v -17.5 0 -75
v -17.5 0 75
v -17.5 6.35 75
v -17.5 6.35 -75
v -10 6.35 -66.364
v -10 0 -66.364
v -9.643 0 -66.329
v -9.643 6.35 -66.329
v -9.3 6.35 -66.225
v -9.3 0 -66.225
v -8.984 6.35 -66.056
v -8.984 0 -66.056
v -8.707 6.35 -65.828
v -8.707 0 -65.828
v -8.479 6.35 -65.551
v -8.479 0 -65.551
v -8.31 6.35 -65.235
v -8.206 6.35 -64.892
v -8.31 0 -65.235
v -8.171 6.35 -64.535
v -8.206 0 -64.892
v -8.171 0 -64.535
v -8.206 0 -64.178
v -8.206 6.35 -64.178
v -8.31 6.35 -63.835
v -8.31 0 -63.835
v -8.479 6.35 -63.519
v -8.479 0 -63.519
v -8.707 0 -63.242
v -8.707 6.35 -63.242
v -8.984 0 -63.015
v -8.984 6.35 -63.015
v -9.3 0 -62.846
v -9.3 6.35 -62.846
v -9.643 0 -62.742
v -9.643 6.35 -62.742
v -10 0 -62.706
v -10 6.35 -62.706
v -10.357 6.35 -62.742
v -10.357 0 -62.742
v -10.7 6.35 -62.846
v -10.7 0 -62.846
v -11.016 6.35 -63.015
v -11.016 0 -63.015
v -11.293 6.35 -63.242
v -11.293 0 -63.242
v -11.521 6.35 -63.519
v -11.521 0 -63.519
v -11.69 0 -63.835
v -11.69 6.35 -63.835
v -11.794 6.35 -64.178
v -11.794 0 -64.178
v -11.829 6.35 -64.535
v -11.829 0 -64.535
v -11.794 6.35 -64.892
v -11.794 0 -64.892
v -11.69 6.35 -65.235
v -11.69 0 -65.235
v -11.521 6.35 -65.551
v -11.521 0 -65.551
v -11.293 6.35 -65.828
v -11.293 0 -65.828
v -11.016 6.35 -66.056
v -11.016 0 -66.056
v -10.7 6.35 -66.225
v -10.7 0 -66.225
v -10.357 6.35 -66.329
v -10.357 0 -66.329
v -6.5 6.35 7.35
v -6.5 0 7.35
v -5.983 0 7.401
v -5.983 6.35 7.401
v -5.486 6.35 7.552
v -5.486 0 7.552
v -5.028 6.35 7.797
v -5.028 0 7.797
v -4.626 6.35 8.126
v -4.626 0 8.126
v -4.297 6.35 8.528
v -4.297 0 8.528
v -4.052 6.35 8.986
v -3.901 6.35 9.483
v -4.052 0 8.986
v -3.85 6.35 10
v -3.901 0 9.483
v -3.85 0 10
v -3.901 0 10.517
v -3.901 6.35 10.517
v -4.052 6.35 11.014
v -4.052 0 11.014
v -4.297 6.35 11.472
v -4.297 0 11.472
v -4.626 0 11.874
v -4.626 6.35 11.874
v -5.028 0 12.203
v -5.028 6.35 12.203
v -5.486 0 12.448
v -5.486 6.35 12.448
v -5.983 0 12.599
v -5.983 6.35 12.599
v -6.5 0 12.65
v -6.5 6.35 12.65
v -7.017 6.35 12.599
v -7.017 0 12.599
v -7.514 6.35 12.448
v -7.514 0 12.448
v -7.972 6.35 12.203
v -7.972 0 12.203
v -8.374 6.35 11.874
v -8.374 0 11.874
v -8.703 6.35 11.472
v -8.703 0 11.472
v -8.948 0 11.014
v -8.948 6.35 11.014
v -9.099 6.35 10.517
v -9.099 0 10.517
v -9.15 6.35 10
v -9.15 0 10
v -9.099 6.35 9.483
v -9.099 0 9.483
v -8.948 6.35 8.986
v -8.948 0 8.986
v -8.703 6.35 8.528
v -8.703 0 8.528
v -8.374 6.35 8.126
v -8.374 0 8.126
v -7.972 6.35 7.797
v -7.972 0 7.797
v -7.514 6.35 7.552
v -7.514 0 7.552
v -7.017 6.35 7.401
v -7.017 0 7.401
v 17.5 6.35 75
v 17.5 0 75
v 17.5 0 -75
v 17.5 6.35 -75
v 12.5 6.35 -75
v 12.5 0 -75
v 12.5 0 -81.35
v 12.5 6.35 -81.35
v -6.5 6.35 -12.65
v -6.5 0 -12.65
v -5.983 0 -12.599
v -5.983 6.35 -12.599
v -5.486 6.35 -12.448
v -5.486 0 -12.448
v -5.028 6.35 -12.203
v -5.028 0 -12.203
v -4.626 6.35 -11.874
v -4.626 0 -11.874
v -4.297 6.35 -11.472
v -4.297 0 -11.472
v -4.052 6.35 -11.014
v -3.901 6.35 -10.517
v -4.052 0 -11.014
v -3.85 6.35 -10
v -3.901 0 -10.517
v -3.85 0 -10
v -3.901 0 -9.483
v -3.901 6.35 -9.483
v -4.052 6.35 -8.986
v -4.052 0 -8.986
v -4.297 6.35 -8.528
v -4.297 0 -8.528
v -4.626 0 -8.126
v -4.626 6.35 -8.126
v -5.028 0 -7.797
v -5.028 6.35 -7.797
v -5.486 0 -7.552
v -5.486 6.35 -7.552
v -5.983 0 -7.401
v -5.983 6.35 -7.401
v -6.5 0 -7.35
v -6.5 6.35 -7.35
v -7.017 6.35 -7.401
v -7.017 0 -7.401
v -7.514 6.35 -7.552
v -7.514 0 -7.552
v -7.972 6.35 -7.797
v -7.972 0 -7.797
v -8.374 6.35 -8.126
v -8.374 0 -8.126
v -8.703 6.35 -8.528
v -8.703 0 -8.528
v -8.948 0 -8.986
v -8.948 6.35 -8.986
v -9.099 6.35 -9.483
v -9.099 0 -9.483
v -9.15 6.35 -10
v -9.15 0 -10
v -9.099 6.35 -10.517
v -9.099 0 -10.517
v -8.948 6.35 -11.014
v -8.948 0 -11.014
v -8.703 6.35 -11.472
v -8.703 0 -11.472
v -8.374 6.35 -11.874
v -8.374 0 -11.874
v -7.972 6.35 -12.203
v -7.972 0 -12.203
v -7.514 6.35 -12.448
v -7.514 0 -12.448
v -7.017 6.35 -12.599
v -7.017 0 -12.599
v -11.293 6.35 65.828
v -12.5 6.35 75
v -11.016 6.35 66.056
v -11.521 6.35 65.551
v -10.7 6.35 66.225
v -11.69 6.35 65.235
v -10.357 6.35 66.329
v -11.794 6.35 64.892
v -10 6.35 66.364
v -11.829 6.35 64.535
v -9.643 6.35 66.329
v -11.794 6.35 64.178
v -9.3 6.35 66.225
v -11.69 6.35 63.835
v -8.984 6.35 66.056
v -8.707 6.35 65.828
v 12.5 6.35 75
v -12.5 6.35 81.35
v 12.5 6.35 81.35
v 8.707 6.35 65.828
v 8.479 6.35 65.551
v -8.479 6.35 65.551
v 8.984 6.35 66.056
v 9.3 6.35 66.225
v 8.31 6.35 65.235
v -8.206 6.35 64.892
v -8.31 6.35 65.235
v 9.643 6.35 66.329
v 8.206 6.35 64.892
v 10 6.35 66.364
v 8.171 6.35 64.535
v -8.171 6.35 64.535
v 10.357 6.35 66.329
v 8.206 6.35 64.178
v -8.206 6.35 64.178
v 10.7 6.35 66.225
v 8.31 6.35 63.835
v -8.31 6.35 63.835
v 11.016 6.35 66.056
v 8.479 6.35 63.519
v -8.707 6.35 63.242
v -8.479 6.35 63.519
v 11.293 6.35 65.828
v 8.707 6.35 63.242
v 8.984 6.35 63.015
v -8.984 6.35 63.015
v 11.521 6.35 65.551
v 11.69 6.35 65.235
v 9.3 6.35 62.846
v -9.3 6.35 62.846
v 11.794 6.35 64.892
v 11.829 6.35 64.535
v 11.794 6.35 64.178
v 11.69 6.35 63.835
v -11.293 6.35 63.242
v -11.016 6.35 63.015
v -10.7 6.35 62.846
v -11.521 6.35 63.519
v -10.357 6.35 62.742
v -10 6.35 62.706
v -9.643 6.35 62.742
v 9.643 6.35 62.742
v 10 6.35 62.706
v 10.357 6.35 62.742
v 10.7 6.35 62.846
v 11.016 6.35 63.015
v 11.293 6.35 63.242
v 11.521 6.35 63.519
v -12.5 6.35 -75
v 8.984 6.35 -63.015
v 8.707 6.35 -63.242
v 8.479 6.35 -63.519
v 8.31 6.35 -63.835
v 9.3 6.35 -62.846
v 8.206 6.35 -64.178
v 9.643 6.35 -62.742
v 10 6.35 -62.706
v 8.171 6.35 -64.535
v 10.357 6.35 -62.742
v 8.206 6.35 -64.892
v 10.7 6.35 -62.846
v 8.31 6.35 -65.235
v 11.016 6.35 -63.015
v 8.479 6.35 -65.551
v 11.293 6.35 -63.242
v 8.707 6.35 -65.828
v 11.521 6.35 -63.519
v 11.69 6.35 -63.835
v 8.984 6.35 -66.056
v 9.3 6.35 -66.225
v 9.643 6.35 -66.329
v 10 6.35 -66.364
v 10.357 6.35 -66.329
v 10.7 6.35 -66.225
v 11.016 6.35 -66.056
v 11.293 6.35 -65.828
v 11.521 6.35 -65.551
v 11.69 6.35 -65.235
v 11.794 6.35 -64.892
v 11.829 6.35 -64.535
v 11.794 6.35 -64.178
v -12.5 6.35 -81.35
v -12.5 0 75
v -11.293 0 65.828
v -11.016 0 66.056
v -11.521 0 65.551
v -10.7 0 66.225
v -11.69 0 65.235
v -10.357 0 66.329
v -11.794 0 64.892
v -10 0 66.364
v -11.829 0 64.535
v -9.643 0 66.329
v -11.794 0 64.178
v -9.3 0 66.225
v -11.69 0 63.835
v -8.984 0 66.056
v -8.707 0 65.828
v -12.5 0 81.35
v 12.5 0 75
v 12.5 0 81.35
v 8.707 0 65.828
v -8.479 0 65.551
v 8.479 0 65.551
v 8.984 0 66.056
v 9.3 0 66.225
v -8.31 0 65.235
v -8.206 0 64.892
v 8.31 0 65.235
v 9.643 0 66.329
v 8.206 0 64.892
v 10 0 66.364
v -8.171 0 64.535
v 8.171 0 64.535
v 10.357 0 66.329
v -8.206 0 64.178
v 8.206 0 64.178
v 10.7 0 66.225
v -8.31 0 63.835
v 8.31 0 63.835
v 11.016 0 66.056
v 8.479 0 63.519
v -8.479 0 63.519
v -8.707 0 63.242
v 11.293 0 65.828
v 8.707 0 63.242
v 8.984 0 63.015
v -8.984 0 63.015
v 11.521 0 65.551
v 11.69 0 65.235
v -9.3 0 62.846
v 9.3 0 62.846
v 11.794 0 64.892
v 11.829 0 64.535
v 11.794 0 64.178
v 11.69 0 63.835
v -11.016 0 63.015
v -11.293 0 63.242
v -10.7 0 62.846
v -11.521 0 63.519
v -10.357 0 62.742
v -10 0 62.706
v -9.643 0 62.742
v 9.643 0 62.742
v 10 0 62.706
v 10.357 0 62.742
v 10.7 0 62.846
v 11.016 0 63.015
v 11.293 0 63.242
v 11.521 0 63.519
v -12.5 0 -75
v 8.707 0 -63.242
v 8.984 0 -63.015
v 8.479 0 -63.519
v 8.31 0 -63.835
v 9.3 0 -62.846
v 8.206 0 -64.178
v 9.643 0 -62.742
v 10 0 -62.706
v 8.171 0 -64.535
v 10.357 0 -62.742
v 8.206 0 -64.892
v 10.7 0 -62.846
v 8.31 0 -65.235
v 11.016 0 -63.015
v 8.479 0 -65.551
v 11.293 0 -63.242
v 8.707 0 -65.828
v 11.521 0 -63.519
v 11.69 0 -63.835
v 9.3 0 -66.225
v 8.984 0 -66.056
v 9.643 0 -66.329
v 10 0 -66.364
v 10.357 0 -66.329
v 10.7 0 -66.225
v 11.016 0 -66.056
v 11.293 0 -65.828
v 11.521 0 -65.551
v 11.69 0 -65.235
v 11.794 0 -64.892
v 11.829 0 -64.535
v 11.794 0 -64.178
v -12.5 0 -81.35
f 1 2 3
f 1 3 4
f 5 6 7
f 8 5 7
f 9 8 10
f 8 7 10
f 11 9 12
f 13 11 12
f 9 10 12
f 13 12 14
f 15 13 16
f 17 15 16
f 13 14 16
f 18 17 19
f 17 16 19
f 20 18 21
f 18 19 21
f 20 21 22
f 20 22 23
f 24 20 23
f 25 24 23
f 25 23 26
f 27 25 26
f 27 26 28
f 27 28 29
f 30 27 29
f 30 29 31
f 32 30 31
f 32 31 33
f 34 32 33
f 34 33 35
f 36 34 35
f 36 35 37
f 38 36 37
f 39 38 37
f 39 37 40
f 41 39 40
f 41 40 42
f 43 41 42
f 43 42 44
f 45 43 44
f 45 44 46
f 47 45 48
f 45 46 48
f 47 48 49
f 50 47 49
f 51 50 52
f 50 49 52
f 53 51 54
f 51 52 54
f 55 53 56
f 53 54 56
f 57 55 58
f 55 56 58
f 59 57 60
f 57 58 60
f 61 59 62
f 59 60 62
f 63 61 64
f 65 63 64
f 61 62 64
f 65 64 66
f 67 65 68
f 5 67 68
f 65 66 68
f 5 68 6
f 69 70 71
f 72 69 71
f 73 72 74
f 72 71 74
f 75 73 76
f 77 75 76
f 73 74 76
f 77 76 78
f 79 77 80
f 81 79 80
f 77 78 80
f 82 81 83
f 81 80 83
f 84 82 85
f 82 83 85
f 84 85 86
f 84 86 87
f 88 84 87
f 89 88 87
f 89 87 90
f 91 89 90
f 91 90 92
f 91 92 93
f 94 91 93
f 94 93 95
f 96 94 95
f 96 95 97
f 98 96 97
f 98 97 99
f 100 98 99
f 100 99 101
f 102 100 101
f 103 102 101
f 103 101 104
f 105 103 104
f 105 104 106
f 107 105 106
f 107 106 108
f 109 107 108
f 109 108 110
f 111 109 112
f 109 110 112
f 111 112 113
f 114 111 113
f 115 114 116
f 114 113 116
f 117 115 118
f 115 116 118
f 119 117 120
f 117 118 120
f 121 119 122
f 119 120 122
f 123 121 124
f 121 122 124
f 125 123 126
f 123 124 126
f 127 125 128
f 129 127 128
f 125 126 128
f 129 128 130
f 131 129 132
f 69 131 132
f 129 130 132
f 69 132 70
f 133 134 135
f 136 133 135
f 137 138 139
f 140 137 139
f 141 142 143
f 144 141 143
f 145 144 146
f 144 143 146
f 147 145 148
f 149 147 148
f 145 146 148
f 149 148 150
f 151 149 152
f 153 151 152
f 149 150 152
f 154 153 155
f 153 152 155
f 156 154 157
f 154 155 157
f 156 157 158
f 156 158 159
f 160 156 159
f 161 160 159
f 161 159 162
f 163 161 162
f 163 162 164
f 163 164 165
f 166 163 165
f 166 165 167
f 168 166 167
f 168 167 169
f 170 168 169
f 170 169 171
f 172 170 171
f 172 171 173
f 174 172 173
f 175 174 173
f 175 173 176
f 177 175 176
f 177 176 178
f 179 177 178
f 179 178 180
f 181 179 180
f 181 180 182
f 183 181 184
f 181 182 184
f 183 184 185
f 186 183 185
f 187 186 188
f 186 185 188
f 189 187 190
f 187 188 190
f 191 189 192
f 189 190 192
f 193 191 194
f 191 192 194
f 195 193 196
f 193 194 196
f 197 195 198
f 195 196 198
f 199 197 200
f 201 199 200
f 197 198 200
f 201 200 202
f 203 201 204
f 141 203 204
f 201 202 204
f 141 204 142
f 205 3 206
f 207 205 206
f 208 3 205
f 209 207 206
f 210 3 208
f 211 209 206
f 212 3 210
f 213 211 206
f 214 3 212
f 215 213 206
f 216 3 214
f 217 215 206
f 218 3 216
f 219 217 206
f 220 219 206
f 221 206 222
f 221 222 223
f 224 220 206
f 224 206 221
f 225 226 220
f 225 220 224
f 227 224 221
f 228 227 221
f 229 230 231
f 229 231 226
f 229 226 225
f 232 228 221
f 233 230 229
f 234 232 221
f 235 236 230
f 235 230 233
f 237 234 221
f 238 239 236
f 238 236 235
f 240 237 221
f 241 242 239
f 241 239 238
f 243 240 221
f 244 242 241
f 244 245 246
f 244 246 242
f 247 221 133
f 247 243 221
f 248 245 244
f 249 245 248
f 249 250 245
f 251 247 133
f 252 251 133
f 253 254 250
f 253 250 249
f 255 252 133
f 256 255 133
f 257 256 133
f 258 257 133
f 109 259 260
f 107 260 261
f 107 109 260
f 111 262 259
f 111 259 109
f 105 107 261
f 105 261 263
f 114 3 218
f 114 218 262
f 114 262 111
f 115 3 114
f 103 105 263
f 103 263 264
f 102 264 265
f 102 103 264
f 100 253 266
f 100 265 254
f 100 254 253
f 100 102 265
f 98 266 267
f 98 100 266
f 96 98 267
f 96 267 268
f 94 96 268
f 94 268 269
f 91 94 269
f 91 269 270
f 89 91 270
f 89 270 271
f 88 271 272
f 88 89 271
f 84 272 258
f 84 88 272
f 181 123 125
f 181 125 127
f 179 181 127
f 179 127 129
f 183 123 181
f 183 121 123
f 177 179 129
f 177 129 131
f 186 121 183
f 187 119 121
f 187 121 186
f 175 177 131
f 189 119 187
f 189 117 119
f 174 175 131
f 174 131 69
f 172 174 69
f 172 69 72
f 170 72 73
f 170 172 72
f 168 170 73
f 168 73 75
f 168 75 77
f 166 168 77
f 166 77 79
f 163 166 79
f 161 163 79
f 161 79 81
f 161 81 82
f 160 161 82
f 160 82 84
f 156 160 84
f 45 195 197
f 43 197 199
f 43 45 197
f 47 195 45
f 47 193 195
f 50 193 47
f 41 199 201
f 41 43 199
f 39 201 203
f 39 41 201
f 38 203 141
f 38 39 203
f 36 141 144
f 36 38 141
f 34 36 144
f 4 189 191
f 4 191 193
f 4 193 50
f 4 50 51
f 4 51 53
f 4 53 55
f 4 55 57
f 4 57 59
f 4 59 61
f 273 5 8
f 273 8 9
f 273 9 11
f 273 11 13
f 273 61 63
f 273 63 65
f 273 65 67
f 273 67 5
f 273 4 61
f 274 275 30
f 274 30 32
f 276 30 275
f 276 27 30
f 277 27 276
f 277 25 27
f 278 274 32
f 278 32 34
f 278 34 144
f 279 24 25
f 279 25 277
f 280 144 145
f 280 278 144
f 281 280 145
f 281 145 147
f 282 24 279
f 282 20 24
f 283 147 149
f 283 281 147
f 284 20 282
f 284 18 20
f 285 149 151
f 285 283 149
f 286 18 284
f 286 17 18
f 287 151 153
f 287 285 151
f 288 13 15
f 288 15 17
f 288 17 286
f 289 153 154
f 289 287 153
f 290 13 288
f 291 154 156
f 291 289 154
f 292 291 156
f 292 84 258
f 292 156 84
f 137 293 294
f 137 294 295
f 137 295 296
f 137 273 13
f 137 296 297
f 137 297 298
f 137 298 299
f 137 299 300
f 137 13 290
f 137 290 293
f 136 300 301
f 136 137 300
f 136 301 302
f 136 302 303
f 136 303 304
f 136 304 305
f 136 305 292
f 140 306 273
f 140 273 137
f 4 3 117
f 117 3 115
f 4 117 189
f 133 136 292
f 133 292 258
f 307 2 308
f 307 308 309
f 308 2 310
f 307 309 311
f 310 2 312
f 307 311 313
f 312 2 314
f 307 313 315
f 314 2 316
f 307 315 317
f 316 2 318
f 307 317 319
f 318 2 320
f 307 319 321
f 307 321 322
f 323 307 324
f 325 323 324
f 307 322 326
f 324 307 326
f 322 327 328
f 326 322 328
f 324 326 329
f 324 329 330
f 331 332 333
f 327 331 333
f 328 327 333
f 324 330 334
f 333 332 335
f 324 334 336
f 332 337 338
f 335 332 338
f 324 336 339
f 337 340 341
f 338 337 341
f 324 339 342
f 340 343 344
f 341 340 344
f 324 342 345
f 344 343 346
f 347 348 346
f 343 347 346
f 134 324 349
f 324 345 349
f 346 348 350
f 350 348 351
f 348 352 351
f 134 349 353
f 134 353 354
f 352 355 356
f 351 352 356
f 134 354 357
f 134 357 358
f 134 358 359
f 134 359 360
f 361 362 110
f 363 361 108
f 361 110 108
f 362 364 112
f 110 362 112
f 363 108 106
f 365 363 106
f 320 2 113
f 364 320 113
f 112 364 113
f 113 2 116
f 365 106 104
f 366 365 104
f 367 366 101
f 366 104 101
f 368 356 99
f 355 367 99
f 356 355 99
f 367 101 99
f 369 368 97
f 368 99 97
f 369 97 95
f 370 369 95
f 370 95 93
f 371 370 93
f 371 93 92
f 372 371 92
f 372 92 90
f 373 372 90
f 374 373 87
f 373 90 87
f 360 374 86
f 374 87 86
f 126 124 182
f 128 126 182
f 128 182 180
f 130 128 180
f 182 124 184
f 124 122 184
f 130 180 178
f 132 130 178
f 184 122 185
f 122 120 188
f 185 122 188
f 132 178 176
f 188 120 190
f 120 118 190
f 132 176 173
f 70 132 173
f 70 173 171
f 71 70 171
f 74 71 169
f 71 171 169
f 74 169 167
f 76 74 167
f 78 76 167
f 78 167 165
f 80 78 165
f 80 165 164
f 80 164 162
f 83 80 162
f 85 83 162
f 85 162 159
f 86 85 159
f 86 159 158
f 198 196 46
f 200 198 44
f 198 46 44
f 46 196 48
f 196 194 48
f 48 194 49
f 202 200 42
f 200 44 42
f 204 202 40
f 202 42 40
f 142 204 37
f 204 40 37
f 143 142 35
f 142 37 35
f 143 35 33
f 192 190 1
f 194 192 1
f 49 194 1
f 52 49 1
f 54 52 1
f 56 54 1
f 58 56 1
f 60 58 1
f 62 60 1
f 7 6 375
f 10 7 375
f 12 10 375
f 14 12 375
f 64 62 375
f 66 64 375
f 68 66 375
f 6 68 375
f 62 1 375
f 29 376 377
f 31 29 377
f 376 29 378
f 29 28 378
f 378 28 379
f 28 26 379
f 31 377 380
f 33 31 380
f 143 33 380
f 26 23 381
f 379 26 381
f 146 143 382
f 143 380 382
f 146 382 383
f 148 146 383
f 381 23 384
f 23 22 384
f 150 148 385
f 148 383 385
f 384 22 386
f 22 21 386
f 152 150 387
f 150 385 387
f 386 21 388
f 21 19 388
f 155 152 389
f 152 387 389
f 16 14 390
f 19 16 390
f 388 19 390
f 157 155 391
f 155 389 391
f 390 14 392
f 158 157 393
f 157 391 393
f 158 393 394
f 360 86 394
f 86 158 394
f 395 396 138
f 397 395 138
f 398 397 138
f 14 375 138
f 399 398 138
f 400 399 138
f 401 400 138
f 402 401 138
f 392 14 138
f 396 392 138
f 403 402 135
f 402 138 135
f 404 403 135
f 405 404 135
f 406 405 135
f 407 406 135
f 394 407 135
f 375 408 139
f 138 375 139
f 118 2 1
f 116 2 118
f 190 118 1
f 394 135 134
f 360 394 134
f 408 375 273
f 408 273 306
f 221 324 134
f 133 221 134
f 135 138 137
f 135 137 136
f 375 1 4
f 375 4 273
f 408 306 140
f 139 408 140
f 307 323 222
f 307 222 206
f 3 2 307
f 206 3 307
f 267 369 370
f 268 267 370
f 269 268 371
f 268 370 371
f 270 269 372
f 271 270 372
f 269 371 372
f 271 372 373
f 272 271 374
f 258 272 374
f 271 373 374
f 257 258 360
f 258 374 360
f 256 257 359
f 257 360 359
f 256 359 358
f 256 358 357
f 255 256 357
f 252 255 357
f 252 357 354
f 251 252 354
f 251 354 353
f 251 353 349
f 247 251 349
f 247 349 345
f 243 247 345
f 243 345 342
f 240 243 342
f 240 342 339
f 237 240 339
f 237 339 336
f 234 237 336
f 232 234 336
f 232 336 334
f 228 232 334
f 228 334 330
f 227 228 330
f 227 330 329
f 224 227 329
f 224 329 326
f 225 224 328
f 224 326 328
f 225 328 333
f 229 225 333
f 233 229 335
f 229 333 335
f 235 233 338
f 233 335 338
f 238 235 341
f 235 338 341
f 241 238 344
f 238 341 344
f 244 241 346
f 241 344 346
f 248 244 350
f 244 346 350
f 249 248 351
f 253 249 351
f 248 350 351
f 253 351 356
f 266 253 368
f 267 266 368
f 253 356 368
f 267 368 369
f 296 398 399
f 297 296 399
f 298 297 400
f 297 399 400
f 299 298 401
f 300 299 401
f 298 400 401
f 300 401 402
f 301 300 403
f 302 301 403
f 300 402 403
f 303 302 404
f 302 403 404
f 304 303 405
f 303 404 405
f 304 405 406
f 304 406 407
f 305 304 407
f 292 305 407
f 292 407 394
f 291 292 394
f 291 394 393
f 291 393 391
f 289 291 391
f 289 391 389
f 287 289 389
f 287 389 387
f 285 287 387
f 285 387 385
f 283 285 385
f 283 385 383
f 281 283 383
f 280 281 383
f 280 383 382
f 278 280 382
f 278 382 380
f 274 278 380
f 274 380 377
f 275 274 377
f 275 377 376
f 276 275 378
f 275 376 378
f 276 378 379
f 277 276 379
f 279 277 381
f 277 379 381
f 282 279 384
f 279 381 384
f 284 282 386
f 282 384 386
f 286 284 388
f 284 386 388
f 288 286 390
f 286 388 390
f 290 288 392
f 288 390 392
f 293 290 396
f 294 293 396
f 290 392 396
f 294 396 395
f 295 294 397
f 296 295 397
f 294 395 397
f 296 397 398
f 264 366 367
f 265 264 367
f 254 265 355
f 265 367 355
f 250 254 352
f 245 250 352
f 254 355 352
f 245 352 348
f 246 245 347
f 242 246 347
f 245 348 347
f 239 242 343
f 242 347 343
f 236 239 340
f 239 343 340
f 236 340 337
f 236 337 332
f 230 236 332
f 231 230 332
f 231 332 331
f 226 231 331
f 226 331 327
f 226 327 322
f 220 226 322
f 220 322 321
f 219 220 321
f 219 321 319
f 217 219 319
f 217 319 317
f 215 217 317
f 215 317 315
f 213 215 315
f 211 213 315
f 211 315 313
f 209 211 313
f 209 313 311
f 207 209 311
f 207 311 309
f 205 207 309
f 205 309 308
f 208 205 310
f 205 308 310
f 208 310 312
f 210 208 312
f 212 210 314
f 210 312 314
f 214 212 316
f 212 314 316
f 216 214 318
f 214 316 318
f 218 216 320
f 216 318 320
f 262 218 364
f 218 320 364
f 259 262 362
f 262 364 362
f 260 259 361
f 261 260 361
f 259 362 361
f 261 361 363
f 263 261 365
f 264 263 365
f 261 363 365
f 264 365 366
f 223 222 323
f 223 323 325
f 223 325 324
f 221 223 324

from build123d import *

# Parameters (mm, degrees)
SKETCH1_W             = 35
SKETCH1_H             = 150
BOSS_EXTRUDE1_DEPTH   = 6.35
SKETCH2_W             = 25
SKETCH2_H             = 6.35
BOSS_EXTRUDE2_DEPTH   = 6.35
F_6_CLEARANCE_HOLE1_D = 3.6576
M5_CLEARANCE_HOLE1_D  = 5.3


with BuildPart() as part:
    # Sketch1 → Boss-Extrude1 (new body)
    with BuildSketch(Plane(origin=(0, 0, 0), x_dir=(1, 0, 0), z_dir=(0, 1, 0))):
        Rectangle(SKETCH1_W, SKETCH1_H)
    extrude(amount=BOSS_EXTRUDE1_DEPTH)

    # Sketch2 → Boss-Extrude2 (add)
    with BuildSketch(Plane(origin=(0, 6.35, 0), x_dir=(1, 0, 0), z_dir=(0, 1, 0))):
        with Locations((0, -78.175)):
            Rectangle(SKETCH2_W, SKETCH2_H)
        with Locations((0, 78.175)):
            Rectangle(SKETCH2_W, SKETCH2_H)
    extrude(amount=-BOSS_EXTRUDE2_DEPTH)

    # #6 Clearance Hole1 (through all)
    with Locations(Plane(origin=(-10, 6.35, -64.5352), x_dir=(0, 0, 1), z_dir=(0, 1, 0))):
        with Locations((0, 0), (0, 20), (129.0704, 20), (129.0704, 0)):
            Hole(F_6_CLEARANCE_HOLE1_D / 2)

    # M5 Clearance Hole1 (through all)
    with Locations(Plane(origin=(-6.5, 6.35, 10), x_dir=(0, 0, 1), z_dir=(0, 1, 0))):
        with Locations((0, 0), (-20, 0)):
            Hole(M5_CLEARANCE_HOLE1_D / 2)


solid = part.part
